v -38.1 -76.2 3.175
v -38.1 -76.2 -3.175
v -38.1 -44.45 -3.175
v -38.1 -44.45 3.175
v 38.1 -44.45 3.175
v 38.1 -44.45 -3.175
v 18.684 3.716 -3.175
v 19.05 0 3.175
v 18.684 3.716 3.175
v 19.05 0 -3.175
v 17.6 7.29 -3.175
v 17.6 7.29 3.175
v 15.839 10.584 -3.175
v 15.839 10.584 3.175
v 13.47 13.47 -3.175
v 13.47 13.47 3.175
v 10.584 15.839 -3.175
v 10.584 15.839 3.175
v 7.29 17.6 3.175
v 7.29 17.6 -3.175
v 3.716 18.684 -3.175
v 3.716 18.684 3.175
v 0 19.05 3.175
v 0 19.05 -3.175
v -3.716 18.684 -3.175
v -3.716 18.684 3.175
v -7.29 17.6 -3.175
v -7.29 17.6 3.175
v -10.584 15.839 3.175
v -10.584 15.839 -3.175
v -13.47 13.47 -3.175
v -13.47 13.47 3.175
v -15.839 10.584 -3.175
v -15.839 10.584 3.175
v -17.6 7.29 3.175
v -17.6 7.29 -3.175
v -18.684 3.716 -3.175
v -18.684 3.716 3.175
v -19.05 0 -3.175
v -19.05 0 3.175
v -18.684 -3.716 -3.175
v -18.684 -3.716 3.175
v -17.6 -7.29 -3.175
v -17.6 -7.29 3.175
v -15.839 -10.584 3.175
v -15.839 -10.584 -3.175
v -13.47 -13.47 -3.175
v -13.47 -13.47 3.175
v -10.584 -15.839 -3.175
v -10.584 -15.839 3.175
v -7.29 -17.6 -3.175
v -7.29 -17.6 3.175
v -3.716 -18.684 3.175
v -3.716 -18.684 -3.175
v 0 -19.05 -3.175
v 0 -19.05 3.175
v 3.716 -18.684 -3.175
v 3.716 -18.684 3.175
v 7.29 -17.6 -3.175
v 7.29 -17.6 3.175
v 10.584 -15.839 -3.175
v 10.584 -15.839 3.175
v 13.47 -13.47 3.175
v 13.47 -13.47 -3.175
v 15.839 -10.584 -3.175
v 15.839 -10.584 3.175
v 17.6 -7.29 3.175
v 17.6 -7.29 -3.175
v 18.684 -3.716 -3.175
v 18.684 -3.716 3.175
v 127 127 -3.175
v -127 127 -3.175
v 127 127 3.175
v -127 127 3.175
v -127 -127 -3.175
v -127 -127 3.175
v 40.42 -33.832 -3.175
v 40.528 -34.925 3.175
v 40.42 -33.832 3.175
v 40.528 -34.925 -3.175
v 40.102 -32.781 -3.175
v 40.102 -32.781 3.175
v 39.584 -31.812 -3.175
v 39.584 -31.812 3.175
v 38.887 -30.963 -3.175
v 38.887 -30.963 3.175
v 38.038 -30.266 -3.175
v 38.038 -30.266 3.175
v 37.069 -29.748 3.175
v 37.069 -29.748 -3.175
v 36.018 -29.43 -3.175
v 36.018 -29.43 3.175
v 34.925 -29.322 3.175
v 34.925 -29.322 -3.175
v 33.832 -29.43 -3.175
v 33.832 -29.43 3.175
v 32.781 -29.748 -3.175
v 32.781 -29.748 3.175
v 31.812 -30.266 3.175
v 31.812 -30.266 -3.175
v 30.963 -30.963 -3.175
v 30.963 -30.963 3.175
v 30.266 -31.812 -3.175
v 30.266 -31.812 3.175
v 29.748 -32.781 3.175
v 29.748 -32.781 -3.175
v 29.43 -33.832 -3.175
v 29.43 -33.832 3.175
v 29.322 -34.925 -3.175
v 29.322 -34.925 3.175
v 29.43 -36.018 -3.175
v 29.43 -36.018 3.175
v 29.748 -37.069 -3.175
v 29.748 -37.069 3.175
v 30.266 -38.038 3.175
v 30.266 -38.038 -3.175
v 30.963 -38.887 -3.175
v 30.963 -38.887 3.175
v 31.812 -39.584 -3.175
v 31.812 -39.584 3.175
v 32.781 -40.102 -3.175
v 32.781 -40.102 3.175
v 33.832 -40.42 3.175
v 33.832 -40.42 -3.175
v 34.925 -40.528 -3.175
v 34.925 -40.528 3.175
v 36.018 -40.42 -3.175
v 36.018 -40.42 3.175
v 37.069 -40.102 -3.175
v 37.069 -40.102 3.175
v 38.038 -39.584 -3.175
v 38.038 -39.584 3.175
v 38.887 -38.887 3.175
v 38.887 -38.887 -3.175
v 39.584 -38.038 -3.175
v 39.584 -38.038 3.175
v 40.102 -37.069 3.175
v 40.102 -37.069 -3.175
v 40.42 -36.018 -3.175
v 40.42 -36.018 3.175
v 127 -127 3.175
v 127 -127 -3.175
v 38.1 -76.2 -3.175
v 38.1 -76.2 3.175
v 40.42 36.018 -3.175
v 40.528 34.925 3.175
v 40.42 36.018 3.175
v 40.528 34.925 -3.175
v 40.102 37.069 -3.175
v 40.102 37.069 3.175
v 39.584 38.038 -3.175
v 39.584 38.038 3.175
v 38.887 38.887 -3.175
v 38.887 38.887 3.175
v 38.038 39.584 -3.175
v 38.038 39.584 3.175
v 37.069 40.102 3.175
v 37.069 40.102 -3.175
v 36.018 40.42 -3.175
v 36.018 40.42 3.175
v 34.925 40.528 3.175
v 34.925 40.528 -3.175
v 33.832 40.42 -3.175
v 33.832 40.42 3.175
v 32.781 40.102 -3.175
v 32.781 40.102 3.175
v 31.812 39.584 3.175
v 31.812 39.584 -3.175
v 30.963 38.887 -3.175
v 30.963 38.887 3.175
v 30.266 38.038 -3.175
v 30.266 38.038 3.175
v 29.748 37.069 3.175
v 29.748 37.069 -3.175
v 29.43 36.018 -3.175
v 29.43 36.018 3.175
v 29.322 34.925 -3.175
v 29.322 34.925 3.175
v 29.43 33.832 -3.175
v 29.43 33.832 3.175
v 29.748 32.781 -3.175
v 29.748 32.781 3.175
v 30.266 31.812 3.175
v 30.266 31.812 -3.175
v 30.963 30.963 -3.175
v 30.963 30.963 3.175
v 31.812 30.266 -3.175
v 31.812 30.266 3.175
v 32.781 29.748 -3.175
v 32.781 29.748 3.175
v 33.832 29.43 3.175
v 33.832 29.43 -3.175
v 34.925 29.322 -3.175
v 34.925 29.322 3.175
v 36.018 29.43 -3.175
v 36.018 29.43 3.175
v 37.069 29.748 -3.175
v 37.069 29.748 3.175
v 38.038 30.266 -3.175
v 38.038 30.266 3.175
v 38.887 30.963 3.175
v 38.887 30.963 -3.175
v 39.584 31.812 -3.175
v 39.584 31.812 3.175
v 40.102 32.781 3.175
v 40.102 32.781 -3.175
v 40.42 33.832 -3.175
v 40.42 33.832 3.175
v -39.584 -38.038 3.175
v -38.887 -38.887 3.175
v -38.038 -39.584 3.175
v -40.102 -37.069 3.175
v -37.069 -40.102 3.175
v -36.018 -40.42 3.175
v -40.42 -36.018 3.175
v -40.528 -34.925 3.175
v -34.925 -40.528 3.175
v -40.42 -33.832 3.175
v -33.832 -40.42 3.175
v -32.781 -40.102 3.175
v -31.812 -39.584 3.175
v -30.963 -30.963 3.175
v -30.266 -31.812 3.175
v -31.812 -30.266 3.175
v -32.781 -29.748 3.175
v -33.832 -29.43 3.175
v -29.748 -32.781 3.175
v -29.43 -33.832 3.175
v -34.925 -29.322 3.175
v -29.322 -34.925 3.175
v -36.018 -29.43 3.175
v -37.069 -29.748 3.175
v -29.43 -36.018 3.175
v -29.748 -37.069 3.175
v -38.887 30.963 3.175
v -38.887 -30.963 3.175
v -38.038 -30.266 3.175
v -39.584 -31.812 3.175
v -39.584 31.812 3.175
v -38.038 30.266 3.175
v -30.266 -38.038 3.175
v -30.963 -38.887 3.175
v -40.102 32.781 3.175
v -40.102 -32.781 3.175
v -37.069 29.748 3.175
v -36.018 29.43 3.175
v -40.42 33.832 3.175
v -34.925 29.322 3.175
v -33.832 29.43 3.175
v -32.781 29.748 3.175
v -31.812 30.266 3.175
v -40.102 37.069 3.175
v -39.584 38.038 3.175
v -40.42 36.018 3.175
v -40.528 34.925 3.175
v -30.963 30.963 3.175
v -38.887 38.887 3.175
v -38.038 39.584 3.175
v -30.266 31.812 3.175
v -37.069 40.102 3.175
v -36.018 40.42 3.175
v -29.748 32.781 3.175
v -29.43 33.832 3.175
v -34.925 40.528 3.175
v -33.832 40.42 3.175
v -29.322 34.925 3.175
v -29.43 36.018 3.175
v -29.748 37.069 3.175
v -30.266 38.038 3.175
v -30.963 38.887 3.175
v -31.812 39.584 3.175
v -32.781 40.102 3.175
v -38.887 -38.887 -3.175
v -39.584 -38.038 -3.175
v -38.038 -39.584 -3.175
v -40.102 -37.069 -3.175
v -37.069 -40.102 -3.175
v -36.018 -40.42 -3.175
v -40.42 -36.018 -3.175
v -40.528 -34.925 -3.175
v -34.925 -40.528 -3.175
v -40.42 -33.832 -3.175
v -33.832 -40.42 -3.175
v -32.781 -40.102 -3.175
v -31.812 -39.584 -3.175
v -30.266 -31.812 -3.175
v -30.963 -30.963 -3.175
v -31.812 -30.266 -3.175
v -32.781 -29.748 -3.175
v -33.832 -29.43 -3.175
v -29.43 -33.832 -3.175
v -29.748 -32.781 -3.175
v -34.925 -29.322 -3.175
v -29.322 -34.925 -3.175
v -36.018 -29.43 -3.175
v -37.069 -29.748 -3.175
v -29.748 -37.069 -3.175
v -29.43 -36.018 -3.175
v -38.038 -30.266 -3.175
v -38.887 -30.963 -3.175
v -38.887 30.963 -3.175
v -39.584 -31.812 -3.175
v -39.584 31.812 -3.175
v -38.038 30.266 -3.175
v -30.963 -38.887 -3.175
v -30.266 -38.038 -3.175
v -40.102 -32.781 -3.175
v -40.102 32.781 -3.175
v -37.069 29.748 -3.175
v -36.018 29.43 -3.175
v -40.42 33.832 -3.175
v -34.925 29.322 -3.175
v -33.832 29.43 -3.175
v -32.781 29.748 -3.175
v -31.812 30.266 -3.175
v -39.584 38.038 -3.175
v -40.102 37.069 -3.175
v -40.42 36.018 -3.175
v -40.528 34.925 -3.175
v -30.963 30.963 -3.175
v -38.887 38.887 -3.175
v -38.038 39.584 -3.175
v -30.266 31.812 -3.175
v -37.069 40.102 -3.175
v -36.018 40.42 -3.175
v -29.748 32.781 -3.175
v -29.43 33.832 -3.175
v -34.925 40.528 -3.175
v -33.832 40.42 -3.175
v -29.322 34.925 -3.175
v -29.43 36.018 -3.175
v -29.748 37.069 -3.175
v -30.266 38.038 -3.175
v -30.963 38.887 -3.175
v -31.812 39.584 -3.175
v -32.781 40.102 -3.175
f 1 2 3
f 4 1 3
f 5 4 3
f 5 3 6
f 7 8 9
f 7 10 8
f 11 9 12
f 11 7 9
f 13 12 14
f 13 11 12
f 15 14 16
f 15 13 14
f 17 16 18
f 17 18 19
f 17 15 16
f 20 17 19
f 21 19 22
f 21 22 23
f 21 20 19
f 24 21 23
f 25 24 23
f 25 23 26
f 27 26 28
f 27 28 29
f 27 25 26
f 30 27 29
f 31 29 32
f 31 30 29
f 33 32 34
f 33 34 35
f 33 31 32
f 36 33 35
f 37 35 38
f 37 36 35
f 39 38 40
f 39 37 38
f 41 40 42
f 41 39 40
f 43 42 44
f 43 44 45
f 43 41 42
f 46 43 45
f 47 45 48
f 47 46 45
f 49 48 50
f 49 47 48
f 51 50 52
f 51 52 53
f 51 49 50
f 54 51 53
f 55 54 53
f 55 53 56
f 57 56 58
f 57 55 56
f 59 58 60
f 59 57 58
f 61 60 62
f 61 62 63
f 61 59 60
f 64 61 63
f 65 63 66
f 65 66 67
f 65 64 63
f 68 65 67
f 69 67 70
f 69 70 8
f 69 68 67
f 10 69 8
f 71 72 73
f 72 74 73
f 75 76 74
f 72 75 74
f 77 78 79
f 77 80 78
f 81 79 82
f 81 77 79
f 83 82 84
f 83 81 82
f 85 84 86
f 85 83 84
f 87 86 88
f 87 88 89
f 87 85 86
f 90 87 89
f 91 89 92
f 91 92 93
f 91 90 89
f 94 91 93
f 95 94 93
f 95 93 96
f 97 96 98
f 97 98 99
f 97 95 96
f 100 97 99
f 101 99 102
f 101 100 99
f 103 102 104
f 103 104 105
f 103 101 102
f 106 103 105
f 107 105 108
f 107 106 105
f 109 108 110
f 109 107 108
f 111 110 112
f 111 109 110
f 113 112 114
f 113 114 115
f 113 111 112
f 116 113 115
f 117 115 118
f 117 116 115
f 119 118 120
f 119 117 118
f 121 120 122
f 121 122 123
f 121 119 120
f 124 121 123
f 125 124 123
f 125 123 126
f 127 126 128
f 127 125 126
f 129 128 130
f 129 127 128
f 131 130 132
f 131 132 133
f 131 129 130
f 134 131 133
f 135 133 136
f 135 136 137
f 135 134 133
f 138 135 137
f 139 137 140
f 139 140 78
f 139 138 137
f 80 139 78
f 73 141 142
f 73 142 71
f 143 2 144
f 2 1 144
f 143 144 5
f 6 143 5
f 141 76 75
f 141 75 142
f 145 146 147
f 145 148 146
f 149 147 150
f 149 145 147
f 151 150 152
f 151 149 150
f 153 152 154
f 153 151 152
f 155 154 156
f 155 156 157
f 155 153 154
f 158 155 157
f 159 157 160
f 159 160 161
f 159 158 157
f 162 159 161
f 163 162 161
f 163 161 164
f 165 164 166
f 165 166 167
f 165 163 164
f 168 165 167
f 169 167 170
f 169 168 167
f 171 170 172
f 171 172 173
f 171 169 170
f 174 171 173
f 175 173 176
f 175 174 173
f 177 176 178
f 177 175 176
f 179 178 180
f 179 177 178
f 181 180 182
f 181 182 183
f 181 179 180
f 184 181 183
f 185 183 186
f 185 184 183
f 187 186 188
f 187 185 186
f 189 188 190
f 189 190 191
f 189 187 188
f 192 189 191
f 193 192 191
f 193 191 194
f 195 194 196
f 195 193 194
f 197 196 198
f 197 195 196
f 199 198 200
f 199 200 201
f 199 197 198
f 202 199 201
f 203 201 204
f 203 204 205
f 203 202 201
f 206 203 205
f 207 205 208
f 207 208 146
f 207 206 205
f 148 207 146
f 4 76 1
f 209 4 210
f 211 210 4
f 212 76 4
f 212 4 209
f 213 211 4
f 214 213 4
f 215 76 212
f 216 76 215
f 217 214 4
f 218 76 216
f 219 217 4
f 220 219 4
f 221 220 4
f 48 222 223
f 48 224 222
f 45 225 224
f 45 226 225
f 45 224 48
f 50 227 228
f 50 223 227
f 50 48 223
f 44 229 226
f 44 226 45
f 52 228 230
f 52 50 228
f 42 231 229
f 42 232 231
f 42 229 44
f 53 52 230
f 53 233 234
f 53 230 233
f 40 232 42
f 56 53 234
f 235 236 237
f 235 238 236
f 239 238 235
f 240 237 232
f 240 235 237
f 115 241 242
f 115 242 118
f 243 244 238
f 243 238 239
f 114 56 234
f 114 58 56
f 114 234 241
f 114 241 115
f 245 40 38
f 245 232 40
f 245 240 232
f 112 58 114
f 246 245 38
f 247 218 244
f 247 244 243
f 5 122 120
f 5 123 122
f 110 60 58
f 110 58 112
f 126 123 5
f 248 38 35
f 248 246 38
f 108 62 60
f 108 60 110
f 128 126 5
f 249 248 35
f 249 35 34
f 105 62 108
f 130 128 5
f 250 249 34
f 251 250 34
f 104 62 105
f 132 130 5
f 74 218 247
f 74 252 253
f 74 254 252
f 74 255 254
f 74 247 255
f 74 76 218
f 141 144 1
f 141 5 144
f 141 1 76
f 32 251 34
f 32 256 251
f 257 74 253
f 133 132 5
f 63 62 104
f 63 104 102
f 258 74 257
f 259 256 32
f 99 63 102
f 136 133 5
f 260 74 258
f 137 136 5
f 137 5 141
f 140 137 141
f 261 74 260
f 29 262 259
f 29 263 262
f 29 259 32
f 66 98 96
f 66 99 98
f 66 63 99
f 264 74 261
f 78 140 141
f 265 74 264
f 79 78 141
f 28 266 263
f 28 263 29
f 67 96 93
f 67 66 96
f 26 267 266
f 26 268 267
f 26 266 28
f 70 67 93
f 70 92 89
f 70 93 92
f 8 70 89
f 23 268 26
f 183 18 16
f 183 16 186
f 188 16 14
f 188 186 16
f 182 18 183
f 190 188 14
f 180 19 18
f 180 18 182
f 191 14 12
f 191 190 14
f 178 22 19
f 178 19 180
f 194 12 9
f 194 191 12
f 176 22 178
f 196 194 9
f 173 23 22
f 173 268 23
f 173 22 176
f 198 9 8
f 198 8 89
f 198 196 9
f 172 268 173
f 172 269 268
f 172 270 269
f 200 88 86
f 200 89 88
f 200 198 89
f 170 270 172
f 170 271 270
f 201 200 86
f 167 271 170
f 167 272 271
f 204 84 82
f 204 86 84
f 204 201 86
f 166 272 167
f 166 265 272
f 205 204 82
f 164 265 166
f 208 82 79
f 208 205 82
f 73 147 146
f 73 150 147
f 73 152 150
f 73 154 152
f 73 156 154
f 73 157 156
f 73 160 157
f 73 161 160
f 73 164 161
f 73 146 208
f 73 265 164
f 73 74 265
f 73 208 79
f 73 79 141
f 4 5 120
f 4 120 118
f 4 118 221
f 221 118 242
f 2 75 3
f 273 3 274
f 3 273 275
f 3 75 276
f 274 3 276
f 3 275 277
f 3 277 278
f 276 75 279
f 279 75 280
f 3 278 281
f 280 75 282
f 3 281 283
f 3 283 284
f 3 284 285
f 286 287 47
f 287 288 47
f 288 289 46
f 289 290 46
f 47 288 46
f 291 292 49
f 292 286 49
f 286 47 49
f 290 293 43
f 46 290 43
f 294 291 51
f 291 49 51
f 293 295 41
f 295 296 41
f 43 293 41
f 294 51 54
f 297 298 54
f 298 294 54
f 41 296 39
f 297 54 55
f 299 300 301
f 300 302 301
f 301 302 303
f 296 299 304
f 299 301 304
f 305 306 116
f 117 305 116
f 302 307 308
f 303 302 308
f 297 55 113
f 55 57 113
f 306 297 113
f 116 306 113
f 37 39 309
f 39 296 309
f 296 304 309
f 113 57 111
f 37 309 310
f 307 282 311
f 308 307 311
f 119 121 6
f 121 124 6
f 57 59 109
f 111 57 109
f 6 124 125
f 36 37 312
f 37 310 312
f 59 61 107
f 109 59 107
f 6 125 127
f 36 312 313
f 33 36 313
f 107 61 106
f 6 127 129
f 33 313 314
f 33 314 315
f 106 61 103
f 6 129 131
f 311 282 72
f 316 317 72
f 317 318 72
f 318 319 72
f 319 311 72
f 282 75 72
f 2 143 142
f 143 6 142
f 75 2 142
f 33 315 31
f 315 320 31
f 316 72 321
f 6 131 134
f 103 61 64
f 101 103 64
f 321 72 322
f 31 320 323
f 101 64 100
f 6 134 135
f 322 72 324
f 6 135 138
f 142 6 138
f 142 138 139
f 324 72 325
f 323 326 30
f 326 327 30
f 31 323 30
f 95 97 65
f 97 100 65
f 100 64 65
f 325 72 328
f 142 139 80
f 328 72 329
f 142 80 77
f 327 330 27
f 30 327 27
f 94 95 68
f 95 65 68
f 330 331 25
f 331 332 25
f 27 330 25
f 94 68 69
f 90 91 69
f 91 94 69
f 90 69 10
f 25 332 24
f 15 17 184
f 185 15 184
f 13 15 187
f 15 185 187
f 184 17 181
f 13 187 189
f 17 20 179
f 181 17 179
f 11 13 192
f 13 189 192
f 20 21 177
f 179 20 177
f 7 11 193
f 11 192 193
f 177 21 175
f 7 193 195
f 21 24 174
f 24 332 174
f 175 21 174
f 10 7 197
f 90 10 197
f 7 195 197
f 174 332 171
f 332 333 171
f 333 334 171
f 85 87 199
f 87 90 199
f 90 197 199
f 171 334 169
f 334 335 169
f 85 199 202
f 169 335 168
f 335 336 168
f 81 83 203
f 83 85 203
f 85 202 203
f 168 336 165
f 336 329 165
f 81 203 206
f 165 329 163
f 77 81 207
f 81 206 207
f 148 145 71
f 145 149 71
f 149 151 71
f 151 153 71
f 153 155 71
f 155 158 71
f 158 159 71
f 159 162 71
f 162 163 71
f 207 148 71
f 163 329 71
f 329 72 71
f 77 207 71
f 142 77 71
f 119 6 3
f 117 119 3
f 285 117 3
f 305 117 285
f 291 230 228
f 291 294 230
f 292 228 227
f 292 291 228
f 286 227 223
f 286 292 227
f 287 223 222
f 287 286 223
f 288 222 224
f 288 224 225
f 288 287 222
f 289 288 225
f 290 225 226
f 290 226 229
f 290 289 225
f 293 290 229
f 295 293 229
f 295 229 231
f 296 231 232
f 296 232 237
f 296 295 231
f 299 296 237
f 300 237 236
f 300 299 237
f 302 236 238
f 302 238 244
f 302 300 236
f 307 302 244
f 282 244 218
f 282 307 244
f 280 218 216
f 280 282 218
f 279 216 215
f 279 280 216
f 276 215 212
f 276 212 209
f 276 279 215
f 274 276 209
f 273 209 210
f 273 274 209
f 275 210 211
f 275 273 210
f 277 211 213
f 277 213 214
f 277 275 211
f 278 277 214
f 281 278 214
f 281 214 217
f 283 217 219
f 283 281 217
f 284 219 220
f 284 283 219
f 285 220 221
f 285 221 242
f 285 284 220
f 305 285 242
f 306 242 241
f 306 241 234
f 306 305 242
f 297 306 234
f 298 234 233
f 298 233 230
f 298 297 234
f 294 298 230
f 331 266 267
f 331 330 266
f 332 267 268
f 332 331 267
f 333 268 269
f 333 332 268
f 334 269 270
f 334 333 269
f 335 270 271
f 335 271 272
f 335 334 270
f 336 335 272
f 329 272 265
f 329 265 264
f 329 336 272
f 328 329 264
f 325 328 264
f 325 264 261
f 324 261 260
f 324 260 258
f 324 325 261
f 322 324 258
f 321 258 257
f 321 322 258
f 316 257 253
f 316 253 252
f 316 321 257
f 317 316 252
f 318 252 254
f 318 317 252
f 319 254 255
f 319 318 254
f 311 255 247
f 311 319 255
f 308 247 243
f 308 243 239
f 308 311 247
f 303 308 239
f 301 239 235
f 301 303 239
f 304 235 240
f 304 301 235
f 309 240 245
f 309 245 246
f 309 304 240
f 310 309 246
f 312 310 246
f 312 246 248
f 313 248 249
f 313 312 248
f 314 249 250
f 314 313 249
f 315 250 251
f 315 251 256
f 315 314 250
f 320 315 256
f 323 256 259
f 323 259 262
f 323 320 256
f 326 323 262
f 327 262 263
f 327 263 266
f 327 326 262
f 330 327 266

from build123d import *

# Parameters (mm, degrees)
SKETCH1_W           = 254
SKETCH1_H           = 254
SKETCH1_R           = 19.05
SKETCH1_R_2         = 5.603093475
SKETCH1_W_2         = 76.2
SKETCH1_H_2         = 31.75
BOSS_EXTRUDE1_DEPTH = 3.175


with BuildPart() as part:
    # Sketch1 → Boss-Extrude1 (new, symmetric)
    with BuildSketch(Plane.XY):
        Rectangle(SKETCH1_W, SKETCH1_H)
        Circle(SKETCH1_R, mode=Mode.SUBTRACT)
        with Locations((-34.925, 34.925)):
            Circle(SKETCH1_R_2, mode=Mode.SUBTRACT)
        with Locations((34.925, 34.925)):
            Circle(SKETCH1_R_2, mode=Mode.SUBTRACT)
        with Locations((-34.925, -34.925)):
            Circle(SKETCH1_R_2, mode=Mode.SUBTRACT)
        with Locations((34.925, -34.925)):
            Circle(SKETCH1_R_2, mode=Mode.SUBTRACT)
        with Locations((0, -60.325)):
            Rectangle(SKETCH1_W_2, SKETCH1_H_2, mode=Mode.SUBTRACT)
    extrude(amount=BOSS_EXTRUDE1_DEPTH, both=True)


solid = part.part
